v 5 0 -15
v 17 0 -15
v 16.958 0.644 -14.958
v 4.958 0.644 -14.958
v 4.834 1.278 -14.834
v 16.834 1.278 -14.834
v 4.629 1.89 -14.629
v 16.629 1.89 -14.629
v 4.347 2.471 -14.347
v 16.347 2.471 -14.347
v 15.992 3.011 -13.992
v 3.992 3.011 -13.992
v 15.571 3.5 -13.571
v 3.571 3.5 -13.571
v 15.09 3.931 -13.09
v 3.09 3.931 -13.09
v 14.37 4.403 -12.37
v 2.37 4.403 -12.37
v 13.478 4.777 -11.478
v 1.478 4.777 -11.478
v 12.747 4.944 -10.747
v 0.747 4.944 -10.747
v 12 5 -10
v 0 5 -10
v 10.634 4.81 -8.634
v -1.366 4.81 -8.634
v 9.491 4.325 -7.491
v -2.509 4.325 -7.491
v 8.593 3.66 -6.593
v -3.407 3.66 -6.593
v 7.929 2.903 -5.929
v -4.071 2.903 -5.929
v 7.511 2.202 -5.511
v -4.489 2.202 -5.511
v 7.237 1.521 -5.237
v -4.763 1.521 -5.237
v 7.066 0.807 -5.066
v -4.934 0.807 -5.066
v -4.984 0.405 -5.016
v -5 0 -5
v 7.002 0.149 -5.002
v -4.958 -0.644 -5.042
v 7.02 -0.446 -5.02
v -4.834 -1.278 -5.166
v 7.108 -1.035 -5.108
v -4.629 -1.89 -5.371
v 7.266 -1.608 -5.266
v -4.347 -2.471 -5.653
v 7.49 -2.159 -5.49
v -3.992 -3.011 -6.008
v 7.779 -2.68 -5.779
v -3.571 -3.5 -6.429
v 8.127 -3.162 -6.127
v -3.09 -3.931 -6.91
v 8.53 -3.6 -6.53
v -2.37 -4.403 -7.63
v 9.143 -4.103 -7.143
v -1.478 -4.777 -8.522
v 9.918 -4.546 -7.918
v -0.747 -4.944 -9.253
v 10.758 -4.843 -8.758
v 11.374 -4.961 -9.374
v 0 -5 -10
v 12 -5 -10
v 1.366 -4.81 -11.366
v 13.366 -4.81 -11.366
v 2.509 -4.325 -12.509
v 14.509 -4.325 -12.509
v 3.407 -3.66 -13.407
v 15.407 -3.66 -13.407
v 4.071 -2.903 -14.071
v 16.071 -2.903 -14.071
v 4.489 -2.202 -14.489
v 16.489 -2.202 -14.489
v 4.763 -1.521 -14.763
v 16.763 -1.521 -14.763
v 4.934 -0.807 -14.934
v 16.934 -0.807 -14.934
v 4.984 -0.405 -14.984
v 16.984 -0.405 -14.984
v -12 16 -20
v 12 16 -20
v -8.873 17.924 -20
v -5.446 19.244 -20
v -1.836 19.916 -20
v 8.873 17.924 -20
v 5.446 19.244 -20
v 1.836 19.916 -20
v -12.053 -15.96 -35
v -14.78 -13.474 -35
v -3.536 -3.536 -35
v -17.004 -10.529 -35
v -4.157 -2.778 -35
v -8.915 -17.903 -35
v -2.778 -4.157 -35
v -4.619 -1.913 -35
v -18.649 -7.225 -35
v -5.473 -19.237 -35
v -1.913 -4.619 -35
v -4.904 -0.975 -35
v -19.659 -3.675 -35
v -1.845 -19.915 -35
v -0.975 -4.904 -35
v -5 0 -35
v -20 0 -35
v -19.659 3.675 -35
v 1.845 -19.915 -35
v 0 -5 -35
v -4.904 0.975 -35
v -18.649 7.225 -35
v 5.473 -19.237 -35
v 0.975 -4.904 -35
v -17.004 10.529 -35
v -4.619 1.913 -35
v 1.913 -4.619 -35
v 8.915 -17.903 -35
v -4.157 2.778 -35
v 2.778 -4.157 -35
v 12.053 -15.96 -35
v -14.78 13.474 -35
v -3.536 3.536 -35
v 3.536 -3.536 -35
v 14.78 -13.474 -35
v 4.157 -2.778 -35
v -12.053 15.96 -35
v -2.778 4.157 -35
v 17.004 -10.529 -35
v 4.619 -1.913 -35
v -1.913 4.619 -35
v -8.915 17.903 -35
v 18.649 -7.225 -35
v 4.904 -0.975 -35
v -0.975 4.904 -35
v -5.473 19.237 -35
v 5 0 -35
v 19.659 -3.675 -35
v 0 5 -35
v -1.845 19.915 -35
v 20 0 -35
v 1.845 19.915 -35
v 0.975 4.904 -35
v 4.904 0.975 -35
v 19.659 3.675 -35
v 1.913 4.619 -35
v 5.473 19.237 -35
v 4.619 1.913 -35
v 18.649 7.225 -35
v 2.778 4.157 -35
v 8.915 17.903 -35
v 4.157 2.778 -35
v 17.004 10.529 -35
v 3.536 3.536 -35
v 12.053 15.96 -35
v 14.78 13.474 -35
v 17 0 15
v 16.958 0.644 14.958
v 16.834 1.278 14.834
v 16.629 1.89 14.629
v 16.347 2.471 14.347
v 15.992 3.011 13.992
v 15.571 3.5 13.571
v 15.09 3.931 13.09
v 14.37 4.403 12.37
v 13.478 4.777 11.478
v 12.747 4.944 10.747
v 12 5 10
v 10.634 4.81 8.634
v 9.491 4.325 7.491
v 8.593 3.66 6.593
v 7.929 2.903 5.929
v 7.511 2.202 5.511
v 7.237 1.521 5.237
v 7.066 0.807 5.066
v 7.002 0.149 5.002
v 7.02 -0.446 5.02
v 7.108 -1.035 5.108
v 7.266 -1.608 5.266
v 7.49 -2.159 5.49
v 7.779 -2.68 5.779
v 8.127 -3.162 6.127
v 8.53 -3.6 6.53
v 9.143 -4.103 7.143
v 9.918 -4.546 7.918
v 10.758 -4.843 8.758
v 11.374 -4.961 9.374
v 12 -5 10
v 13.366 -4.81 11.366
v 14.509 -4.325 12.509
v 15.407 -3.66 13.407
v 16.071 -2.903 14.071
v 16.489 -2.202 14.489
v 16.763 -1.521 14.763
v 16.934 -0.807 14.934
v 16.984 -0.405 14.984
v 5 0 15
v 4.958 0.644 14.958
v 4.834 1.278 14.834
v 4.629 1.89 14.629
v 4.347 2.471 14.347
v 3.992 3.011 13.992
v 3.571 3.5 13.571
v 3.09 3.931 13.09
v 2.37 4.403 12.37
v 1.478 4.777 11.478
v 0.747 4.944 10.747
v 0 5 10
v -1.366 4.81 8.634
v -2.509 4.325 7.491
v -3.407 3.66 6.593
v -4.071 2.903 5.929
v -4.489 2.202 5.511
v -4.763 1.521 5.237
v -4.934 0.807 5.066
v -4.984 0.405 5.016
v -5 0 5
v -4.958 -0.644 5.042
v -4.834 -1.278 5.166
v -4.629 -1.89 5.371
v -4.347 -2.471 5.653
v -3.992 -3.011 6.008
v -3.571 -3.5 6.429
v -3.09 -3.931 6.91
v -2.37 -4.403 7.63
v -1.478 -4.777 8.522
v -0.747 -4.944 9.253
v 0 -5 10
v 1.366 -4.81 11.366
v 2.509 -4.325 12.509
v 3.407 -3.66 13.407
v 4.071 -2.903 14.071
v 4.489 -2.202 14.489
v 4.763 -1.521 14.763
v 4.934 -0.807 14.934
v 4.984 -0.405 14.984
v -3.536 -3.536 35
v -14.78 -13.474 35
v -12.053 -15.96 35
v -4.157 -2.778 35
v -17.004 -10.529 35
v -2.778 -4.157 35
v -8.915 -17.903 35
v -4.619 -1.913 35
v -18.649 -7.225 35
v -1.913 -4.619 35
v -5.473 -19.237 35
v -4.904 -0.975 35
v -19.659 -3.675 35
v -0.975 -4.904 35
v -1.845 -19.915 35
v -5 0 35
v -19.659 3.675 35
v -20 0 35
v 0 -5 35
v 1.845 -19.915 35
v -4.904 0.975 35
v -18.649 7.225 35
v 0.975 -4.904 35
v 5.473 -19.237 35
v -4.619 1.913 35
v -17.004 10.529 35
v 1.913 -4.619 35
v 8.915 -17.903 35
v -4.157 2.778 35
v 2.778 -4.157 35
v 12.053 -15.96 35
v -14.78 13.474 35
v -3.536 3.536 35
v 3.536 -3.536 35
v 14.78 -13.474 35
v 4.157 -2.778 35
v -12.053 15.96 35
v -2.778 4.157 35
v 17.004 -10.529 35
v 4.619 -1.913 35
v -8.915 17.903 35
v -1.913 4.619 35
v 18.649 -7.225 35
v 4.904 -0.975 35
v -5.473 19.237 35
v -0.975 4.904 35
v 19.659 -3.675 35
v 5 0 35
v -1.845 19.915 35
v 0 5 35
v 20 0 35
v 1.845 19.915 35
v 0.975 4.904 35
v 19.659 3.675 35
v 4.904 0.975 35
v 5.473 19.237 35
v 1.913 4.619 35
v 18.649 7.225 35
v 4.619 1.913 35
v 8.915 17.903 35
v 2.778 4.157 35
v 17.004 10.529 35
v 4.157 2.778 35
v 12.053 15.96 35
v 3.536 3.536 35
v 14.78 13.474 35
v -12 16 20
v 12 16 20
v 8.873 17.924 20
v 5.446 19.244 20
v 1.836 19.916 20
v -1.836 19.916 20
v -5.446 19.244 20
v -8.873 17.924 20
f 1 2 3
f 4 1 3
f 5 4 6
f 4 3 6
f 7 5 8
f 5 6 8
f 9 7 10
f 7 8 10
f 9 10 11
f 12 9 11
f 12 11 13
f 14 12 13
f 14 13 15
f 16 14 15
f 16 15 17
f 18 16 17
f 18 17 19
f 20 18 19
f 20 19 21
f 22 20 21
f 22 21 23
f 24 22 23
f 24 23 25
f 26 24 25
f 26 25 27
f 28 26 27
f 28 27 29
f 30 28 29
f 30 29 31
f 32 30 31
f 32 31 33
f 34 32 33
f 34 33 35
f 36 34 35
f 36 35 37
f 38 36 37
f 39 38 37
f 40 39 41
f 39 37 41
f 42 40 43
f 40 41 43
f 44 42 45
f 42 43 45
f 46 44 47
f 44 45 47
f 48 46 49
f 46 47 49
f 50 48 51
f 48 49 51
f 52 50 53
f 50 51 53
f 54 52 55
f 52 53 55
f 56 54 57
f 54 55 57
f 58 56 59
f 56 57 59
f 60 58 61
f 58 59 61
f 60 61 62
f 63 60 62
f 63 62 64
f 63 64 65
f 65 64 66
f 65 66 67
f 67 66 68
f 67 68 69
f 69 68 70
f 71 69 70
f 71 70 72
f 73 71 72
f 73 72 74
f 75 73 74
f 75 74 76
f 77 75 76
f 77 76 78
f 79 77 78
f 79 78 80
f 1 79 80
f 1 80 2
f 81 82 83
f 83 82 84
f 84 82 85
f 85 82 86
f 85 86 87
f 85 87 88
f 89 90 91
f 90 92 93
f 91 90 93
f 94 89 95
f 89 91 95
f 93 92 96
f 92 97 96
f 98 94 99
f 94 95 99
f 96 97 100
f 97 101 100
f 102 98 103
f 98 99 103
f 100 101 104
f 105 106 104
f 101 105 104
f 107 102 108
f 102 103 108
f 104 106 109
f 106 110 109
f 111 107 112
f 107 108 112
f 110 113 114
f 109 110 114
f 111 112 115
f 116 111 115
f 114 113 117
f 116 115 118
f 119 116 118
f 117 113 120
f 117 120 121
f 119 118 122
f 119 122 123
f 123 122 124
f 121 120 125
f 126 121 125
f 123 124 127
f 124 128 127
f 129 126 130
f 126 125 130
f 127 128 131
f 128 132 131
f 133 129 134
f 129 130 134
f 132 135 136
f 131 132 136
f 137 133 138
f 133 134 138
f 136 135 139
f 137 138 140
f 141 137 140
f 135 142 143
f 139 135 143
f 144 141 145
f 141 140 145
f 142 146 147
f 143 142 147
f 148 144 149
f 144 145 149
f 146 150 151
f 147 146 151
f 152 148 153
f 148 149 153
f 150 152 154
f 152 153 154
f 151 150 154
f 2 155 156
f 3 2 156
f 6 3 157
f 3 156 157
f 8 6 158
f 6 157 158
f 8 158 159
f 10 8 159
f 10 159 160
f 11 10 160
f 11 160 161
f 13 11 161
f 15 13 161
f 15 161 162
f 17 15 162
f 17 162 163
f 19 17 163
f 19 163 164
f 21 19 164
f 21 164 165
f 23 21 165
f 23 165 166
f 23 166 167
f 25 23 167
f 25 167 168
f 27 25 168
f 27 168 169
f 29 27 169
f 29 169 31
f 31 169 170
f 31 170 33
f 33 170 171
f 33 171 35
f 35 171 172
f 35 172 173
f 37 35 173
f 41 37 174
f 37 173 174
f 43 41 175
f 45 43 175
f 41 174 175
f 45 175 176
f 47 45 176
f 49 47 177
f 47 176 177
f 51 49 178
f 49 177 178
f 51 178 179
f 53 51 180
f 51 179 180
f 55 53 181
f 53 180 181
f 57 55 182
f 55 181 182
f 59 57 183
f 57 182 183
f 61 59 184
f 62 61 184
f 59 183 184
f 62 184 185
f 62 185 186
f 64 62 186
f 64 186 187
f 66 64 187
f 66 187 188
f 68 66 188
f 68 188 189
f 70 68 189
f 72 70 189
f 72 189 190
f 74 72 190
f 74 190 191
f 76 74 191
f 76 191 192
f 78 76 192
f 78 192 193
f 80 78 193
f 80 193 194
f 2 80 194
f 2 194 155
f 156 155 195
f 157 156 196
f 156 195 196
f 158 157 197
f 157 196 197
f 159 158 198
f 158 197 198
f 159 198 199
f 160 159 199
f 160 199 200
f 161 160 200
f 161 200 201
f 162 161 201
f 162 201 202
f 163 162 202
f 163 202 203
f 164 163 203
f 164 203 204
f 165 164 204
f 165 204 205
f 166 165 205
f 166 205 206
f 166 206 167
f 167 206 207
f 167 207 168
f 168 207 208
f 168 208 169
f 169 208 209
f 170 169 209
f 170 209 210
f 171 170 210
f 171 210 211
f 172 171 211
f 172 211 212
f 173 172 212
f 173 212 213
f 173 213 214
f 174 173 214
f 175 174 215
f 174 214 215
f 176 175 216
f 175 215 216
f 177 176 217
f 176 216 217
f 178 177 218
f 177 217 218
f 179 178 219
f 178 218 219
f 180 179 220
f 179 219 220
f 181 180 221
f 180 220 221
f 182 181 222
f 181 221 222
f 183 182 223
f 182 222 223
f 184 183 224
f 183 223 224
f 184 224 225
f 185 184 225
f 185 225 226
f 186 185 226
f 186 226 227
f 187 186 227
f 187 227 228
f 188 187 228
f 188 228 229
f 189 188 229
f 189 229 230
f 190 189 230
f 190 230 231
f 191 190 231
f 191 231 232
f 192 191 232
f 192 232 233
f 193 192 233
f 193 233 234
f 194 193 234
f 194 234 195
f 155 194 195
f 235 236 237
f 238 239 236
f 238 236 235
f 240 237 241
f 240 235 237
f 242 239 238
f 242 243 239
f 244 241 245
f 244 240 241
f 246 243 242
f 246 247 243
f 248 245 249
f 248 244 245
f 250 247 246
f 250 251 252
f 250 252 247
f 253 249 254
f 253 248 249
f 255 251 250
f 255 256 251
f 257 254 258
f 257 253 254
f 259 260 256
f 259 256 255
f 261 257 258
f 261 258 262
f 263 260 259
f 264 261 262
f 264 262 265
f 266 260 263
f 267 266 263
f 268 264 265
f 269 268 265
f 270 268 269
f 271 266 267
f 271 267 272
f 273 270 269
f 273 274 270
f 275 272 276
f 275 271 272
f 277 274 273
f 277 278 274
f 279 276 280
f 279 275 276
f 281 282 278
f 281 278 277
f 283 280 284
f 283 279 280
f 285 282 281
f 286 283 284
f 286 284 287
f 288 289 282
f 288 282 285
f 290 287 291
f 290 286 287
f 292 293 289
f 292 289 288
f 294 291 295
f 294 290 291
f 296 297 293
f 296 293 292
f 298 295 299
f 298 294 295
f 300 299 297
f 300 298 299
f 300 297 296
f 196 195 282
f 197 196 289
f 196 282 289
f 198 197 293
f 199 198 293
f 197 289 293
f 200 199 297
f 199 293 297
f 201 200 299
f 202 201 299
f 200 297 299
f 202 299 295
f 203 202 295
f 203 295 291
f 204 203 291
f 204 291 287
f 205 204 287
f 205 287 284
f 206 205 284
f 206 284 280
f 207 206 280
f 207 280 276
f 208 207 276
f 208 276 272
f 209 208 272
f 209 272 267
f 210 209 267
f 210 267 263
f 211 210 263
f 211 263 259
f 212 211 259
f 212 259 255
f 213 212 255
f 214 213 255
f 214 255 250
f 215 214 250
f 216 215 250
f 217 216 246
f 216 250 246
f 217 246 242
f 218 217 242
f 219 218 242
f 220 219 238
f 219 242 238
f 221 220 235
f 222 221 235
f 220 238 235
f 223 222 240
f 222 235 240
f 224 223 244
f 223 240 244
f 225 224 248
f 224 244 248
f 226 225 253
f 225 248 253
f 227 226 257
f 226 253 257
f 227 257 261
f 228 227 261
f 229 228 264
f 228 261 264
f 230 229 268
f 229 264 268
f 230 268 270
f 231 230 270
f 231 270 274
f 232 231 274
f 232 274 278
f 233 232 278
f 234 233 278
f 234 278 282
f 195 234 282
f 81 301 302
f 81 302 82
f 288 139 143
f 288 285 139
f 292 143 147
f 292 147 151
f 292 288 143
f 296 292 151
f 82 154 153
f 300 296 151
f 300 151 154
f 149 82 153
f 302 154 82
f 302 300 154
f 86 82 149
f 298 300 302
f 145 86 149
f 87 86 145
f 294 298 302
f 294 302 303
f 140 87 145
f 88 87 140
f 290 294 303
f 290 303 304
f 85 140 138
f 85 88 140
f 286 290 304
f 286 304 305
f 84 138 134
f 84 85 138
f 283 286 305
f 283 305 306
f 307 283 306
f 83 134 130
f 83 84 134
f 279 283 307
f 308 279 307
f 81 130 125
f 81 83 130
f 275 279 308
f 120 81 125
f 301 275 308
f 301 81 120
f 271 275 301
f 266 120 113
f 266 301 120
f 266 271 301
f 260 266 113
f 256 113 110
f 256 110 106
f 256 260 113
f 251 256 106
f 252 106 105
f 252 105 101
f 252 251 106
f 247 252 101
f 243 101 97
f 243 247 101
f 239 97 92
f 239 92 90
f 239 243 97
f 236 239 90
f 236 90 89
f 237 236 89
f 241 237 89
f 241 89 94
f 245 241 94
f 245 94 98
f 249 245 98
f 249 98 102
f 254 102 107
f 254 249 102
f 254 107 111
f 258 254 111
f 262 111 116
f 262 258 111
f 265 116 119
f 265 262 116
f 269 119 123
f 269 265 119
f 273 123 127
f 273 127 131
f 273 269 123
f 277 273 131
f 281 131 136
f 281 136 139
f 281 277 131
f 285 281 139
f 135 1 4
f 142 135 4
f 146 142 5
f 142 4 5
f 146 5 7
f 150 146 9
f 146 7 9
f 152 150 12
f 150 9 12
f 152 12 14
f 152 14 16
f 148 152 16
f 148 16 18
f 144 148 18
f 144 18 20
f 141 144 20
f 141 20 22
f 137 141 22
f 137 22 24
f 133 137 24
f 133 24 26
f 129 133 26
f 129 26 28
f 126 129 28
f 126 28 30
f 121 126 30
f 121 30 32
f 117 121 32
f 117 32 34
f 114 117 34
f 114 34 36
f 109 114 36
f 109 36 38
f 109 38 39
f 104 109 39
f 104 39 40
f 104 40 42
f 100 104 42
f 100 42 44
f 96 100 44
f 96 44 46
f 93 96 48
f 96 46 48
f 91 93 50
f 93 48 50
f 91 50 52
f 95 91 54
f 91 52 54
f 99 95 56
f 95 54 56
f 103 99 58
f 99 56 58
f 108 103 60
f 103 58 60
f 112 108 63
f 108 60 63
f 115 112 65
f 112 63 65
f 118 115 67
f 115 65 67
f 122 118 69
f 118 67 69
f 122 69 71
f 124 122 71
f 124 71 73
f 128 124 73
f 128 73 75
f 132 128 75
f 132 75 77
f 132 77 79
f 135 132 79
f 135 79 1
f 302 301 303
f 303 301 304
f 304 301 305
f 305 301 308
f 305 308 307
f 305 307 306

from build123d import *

# Parameters (mm, degrees)
SKETCH1_R               = 20
BOSS_EXTRUDE1_DEPTH     = 35
SKETCH3_R               = 5
SKETCH4_W               = 40
SKETCH4_H               = 4
CUT_EXTRUDE1_DEPTH      = 21
CUT_EXTRUDE1_DEPTH_BACK = 21


with BuildPart() as part:
    # Sketch1 → Boss-Extrude1 (new body, symmetric)
    with BuildSketch(Plane.XY):
        Circle(SKETCH1_R)
    extrude(amount=BOSS_EXTRUDE1_DEPTH, both=True)

    # Cut-Sweep1: sweep along a path in Sketch2
    with BuildLine(Plane(origin=(0, 0, 0), x_dir=(1, 0, 0), z_dir=(0, 1, 0))) as cut_sweep1_path:
        Line((0, 35), (0, 10))
        Line((0, 10), (12, 10))
        Line((12, 10), (12, -10))
        Line((12, -10), (0, -10))
        Line((0, -10), (0, -35))
    # Sketch3 → Cut-Sweep1 (sweep, cut)
    with BuildSketch(Plane.XY.offset(35)):
        Circle(SKETCH3_R)
    sweep(path=cut_sweep1_path.line, transition=Transition.RIGHT, mode=Mode.SUBTRACT)

    # Sketch4 → Cut-Extrude1 (cut, two sides)
    with BuildSketch(Plane(origin=(0, 0, 0), x_dir=(0, 0, -1), z_dir=(1, 0, 0))) as cut_extrude1_sk:
        with Locations((0, 18)):
            Rectangle(SKETCH4_W, SKETCH4_H)
    extrude(amount=CUT_EXTRUDE1_DEPTH, mode=Mode.SUBTRACT)
    extrude(cut_extrude1_sk.sketch, amount=-CUT_EXTRUDE1_DEPTH_BACK, mode=Mode.SUBTRACT)


solid = part.part
